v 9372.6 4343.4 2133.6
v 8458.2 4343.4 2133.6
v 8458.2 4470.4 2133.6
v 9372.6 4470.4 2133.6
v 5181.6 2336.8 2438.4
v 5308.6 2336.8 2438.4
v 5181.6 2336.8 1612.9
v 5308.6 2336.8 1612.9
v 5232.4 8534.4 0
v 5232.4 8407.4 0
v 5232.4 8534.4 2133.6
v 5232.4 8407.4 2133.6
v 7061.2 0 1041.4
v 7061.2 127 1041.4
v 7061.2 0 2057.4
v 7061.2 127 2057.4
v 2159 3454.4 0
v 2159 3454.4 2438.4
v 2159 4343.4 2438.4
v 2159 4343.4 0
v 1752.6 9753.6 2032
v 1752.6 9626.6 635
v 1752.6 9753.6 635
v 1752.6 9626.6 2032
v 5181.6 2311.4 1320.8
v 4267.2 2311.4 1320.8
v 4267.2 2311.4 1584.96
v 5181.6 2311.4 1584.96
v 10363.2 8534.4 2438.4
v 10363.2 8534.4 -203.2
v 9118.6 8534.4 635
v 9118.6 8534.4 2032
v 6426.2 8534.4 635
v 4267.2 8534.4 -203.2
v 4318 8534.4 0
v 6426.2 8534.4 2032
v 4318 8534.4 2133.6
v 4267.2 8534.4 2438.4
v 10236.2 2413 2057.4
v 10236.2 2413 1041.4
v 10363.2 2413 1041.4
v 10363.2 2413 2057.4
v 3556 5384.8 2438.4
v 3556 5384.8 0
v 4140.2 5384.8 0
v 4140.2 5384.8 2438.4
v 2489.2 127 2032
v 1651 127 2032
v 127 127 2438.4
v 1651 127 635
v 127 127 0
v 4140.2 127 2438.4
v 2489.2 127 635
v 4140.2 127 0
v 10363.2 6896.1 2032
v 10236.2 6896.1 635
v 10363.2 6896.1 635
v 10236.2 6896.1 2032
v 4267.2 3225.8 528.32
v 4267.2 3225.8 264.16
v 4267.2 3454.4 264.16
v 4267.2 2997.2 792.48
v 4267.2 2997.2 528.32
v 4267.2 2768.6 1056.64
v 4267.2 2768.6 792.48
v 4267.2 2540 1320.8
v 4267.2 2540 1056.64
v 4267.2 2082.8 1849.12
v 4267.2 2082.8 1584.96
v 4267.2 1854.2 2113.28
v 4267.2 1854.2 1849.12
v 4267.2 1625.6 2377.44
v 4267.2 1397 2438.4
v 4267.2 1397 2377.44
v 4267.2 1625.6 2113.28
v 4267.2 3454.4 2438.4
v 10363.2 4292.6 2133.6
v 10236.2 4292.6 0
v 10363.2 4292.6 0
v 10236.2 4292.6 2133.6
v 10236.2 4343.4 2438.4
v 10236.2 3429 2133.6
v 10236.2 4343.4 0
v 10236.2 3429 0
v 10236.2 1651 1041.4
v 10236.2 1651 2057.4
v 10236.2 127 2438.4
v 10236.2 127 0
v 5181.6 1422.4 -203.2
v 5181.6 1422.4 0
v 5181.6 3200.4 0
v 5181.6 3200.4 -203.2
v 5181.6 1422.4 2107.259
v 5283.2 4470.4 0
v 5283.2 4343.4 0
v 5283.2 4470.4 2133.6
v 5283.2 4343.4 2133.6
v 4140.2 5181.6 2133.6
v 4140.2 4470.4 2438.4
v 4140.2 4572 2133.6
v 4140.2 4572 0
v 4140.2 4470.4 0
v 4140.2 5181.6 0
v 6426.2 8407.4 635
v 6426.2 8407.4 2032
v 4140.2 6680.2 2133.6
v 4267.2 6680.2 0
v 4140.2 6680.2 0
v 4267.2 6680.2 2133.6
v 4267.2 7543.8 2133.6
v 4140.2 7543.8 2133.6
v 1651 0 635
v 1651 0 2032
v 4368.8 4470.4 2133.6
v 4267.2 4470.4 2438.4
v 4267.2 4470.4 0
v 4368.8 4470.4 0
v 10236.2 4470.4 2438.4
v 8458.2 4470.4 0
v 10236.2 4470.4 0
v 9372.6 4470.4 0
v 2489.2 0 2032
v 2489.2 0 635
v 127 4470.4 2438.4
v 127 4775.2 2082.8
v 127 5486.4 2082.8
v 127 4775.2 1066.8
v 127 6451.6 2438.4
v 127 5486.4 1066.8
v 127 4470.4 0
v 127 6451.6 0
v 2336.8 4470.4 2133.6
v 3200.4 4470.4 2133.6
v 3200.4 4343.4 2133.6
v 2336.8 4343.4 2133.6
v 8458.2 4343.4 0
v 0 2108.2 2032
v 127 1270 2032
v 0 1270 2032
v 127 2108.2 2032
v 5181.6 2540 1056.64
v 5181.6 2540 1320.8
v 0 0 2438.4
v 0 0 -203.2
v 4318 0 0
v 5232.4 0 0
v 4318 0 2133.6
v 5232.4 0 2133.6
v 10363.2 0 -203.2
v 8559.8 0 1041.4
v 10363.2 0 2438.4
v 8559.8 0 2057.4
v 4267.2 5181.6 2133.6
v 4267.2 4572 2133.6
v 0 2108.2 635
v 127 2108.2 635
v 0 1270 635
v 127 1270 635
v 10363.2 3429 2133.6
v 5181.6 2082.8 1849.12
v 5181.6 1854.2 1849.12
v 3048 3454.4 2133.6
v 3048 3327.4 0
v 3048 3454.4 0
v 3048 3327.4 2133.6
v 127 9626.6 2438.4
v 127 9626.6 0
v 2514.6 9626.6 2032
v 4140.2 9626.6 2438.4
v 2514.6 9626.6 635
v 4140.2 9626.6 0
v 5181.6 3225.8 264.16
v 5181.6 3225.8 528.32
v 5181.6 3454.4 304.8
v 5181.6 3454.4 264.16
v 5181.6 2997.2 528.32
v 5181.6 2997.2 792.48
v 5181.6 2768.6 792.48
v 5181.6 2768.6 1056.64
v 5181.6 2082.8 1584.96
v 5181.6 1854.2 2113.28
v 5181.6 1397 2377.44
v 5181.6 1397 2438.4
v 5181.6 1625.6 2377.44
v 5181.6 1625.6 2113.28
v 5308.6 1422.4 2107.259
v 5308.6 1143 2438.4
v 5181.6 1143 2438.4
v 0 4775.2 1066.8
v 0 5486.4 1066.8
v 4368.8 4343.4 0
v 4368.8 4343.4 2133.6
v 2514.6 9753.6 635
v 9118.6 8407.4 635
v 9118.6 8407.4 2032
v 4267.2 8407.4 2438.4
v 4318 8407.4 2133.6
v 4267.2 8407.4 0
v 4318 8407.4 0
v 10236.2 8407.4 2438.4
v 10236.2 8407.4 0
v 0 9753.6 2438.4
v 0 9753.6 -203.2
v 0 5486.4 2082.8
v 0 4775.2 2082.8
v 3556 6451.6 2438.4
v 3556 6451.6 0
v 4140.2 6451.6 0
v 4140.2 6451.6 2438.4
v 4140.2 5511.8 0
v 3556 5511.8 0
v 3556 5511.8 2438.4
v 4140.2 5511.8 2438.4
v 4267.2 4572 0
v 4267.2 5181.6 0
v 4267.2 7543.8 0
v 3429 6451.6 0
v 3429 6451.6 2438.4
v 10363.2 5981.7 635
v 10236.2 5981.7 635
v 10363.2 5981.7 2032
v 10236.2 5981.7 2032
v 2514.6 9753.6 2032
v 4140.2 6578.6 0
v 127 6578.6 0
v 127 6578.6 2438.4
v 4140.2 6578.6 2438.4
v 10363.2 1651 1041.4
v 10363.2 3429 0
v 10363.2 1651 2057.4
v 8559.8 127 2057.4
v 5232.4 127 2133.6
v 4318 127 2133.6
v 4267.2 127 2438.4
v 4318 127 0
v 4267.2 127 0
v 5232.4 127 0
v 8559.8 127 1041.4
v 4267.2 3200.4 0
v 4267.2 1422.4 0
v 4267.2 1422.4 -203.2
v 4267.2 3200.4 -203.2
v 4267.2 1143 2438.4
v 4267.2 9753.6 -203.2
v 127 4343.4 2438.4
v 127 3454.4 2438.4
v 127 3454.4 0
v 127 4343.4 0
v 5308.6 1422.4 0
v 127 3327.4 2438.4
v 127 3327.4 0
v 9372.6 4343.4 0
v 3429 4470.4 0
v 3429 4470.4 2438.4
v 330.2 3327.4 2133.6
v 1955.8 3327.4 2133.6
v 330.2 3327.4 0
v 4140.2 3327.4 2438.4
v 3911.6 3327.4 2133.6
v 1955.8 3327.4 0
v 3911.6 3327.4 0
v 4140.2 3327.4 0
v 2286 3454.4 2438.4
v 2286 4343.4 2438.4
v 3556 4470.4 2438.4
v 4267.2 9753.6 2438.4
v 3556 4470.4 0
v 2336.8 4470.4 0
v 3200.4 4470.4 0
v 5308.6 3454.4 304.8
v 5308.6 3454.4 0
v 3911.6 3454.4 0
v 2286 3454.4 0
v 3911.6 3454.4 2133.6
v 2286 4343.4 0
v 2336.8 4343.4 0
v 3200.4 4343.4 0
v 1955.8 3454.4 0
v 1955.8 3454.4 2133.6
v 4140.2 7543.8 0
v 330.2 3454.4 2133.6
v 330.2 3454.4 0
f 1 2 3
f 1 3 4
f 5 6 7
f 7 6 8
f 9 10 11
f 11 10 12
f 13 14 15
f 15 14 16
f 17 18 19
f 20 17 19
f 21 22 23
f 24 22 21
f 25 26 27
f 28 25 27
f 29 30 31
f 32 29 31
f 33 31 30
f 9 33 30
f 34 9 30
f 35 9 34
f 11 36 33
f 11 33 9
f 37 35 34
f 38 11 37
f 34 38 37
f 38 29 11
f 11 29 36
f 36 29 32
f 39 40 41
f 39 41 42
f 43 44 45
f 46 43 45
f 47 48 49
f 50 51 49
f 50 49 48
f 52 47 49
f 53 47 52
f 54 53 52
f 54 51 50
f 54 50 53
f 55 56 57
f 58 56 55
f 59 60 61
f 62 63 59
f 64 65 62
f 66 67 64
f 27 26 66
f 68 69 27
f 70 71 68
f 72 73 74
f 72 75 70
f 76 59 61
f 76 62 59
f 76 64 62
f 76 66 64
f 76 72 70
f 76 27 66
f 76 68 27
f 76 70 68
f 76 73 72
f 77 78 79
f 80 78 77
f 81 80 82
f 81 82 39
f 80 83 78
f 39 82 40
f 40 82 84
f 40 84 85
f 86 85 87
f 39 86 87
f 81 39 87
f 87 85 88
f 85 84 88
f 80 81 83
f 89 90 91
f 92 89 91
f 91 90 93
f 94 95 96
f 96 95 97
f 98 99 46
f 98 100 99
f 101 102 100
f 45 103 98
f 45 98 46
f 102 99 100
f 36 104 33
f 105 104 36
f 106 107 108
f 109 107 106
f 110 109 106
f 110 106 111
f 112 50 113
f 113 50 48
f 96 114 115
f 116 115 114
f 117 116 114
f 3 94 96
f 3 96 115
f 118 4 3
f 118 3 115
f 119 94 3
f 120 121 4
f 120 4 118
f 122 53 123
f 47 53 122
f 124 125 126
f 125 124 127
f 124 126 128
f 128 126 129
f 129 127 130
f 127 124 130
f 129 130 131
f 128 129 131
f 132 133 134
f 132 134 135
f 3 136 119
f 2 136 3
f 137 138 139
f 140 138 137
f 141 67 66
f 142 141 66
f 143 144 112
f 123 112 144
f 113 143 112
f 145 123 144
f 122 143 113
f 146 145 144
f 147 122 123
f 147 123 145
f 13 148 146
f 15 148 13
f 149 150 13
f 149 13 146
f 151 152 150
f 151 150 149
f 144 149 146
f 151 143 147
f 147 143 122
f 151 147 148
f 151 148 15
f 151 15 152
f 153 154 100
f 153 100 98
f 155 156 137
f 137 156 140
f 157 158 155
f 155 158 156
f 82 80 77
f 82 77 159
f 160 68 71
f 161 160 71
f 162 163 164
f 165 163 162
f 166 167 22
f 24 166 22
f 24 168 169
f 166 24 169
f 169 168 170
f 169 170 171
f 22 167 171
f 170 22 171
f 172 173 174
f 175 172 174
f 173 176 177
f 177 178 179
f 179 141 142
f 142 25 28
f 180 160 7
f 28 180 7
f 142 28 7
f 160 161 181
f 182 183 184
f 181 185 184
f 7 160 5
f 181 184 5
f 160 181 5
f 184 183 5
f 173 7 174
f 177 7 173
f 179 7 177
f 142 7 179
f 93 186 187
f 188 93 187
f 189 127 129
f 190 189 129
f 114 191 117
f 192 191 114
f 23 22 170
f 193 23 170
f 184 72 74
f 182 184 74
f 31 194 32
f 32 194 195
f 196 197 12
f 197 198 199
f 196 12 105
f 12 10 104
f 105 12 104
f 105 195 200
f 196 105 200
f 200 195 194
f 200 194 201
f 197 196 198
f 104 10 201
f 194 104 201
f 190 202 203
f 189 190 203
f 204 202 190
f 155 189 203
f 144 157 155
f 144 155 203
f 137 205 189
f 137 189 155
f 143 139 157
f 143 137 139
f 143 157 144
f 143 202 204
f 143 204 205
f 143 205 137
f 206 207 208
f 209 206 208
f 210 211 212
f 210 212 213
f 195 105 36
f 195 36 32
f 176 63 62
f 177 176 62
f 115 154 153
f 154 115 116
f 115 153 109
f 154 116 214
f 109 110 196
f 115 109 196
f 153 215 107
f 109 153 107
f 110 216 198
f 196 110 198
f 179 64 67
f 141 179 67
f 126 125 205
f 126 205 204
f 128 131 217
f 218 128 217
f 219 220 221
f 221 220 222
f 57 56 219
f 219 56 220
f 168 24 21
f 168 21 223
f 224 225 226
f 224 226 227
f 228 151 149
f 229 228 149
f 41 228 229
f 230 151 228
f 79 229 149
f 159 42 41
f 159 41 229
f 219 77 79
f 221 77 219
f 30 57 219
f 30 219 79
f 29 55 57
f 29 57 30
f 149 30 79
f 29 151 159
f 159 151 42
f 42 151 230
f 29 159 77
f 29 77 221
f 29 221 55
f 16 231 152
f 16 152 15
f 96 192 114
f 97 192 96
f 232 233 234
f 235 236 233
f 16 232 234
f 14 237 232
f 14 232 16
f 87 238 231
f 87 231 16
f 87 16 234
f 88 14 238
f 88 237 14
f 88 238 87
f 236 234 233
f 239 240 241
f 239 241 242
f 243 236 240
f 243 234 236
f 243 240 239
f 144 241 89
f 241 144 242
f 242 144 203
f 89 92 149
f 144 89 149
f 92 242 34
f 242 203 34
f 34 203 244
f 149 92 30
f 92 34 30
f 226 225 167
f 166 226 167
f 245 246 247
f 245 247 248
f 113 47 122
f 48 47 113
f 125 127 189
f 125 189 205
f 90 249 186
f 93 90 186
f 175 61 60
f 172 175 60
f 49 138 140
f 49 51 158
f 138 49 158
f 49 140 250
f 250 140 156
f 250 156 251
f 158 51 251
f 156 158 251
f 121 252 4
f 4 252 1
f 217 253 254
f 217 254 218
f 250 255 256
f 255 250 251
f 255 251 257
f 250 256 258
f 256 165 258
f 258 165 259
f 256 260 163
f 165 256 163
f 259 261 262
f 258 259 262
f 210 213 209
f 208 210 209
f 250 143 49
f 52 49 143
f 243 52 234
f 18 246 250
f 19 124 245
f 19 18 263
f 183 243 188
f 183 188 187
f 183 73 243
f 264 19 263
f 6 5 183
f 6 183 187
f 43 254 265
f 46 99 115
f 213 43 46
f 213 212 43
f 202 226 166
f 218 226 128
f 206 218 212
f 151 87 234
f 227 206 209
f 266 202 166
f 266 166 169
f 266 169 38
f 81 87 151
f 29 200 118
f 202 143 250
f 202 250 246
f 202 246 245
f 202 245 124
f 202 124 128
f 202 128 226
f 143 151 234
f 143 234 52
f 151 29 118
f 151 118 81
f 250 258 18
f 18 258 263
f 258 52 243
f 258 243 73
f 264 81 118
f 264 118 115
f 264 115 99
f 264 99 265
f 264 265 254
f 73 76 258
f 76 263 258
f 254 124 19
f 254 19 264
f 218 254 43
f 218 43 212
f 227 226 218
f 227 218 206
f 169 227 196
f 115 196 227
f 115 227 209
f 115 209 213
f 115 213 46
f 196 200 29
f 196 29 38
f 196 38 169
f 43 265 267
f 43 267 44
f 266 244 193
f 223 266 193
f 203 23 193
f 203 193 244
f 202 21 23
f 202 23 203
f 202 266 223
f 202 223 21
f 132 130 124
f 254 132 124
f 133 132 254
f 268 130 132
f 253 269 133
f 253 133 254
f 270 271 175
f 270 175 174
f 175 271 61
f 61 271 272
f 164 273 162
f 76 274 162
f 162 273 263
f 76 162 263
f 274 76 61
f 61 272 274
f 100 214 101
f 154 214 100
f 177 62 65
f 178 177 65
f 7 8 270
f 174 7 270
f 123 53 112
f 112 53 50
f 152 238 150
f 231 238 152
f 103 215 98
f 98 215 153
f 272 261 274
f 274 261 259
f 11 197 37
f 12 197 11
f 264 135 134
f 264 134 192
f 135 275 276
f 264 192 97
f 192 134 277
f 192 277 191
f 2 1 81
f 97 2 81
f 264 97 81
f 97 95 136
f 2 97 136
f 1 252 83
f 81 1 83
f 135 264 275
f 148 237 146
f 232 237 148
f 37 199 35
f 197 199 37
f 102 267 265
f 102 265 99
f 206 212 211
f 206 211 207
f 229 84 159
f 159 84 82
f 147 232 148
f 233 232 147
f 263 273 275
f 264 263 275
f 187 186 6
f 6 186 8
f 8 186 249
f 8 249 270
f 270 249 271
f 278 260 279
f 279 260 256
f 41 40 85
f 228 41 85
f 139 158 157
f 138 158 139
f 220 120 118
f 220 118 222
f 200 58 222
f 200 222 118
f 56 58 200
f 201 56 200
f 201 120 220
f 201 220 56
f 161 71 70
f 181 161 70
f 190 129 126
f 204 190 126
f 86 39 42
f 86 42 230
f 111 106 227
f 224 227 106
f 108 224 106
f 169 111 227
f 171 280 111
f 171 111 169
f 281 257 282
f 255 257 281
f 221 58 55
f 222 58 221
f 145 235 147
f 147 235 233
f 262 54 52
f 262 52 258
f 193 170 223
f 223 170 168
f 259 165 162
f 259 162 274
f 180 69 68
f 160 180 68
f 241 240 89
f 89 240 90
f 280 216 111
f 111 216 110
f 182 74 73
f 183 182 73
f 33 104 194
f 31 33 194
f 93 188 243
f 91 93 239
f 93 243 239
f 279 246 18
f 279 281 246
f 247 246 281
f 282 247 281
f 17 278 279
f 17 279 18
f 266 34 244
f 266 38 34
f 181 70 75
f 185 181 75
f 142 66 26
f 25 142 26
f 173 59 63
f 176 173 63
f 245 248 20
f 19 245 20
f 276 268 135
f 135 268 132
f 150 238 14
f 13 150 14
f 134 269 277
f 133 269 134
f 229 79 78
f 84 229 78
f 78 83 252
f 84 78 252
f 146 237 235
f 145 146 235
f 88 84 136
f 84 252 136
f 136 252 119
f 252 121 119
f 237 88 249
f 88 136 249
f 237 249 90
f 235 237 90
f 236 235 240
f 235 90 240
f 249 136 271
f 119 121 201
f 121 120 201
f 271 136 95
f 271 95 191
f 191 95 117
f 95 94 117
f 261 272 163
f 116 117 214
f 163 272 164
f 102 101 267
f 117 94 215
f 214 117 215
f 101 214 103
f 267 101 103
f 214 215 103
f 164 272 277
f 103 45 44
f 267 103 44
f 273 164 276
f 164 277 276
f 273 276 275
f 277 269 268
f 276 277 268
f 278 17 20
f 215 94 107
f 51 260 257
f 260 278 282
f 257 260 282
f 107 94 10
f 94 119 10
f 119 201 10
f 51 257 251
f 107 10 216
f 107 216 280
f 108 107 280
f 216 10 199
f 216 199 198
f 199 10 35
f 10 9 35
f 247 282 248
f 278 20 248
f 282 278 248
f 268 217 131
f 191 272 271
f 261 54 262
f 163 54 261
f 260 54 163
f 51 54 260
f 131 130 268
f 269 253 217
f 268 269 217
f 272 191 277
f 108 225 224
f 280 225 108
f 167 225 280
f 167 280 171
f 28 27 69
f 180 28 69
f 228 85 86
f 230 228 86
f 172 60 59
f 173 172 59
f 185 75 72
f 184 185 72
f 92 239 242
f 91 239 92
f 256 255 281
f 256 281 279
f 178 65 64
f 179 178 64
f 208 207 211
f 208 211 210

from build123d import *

# Parameters (mm, degrees)
F0_W           = 4013.2
F0_H           = 3200.4
F0_W_2         = 914.4
F0_W_3         = 2032
F0_H_2         = 889
F0_W_4         = 3302
F0_H_3         = 1981.2
F0_W_5         = 584.2
F0_H_4         = 914.4
F0_H_5         = 939.8
F0_H_6         = 3048
F0_W_6         = 5969
F0_H_7         = 3937
F1_DEPTH       = 2438.4
F2_W           = 914.4
F2_H           = 1778
F3_DEPTH       = 203.2
F4_W           = 863.6
F4_H           = 2133.6
F4_W_2         = 762
F4_H_2         = 1016
F5_DEPTH       = 127
F6_W           = 914.4
F6_H           = 2133.6
F7_DEPTH       = 127
F9_DEPTH       = 127
F10_W          = 1498.6
F10_H          = 1016
F10_W_2        = 914.4
F10_H_2        = 2133.6
F11_DEPTH      = 127
F12_W          = 914.4
F12_H          = 1397
F13_DEPTH      = 127
F14_W          = 914.4
F14_H          = 2133.6
F14_W_2        = 2692.4
F14_H_2        = 1397
F15_DEPTH      = 127
F15_DEPTH_BACK = 25.4
F16_W          = 609.6
F16_H          = 2133.6
F16_W_2        = 863.6
F17_DEPTH      = 127
F18_W          = 711.2
F18_H          = 1016
F19_DEPTH      = 127
F20_W          = 863.6
F20_H          = 2133.6
F21_DEPTH      = 127
F22_W          = 863.6
F22_H          = 2133.6
F22_W_2        = 1625.6
F23_DEPTH      = 127
F24_W          = 838.2
F24_H          = 1397
F25_DEPTH      = 127
F26_W          = 838.2
F26_H          = 1397
F27_DEPTH      = 127
F28_W          = 914.4
F28_H          = 2438.4
F29_DEPTH      = 127
F35_DEPTH      = 914.4
F31_DEPTH      = 127
F32_W          = 762
F32_H          = 1397
F33_DEPTH      = 127


with BuildPart() as f1:
    # F0 (on Top) → F1 (new body)
    with BuildSketch(Plane.XY):
        Polygon((0, 9753.6), (0, 0), (10363.2, 0), (10363.2, 8534.4), (4267.2, 8534.4), (4267.2, 9753.6), align=None)
        with Locations((2133.6, 1727.2)):
            Rectangle(F0_W, F0_H, mode=Mode.SUBTRACT)
        with Locations((4724.4, 1727.2)):
            Rectangle(F0_W_2, F0_H, mode=Mode.SUBTRACT)
        with Locations((1143, 3898.9)):
            Rectangle(F0_W_3, F0_H_2, mode=Mode.SUBTRACT)
        Polygon((5308.6, 3454.4), (2286, 3454.4), (2286, 4343.4), (10236.2, 4343.4), (10236.2, 127), (5308.6, 127), align=None, mode=Mode.SUBTRACT)
        with Locations((1778, 5461)):
            Rectangle(F0_W_4, F0_H_3, mode=Mode.SUBTRACT)
        with Locations((3848.1, 4927.6)):
            Rectangle(F0_W_5, F0_H_4, mode=Mode.SUBTRACT)
        with Locations((3848.1, 5981.7)):
            Rectangle(F0_W_5, F0_H_5, mode=Mode.SUBTRACT)
        with Locations((2133.6, 8102.6)):
            Rectangle(F0_W, F0_H_6, mode=Mode.SUBTRACT)
        with Locations((7251.7, 6438.9)):
            Rectangle(F0_W_6, F0_H_7, mode=Mode.SUBTRACT)
    extrude(amount=F1_DEPTH)

    # F2 (on Top) → F3 (join)
    with BuildSketch(Plane.XY):
        Polygon((0, 9753.6), (0, 0), (10363.2, 0), (10363.2, 8534.4), (4267.2, 8534.4), (4267.2, 9753.6), align=None)
        with Locations((4724.4, 2311.4)):
            Rectangle(F2_W, F2_H, mode=Mode.SUBTRACT)
    extrude(amount=-F3_DEPTH)

    # F4 (on face) → F5 (cut, through all)
    with BuildSketch(Plane(origin=(10236.2, 0, 0), x_dir=(0, -1, 0), z_dir=(-1, 0, 0))):
        with Locations((-3860.8, 1066.8)):
            Rectangle(F4_W, F4_H)
        with Locations((-2032, 1549.4)):
            Rectangle(F4_W_2, F4_H_2)
    extrude(amount=-F5_DEPTH, mode=Mode.SUBTRACT)

    # F6 (on face) → F7 (cut, through all)
    with BuildSketch(Plane.XZ.offset(-4343.4)):
        with Locations((4826, 1066.8)):
            Rectangle(F6_W, F6_H)
        with Locations((8915.4, 1066.8)):
            Rectangle(F6_W, F6_H)
    extrude(amount=-F7_DEPTH, mode=Mode.SUBTRACT)

    # F8 (on face) → F9 (cut, through all)
    with BuildSketch(Plane.YZ.offset(5308.6)):
        Polygon((127, 2438.4), (127, 0), (1422.4, 0), (1422.4, 2107.259259), (1143, 2438.4), align=None)
    extrude(amount=-F9_DEPTH, mode=Mode.SUBTRACT)

    # F10 (on face) → F11 (cut, through all)
    with BuildSketch(Plane(origin=(0, 127, 0), x_dir=(-1, 0, 0), z_dir=(0, 1, 0))):
        with Locations((-7810.5, 1549.4)):
            Rectangle(F10_W, F10_H)
        with Locations((-4775.2, 1066.8)):
            Rectangle(F10_W_2, F10_H_2)
    extrude(amount=-F11_DEPTH, mode=Mode.SUBTRACT)

    # F12 (on face) → F13 (cut, through all)
    with BuildSketch(Plane(origin=(10236.2, 0, 0), x_dir=(0, -1, 0), z_dir=(-1, 0, 0))):
        with Locations((-6438.9, 1333.5)):
            Rectangle(F12_W, F12_H)
    extrude(amount=-F13_DEPTH, mode=Mode.SUBTRACT)

    # F14 (on face) → F15 (cut, two sides)
    with BuildSketch(Plane.XZ.offset(-8407.4)) as f15_sk:
        with Locations((4775.2, 1066.8)):
            Rectangle(F14_W, F14_H)
        with Locations((7772.4, 1333.5)):
            Rectangle(F14_W_2, F14_H_2)
    extrude(amount=-F15_DEPTH, mode=Mode.SUBTRACT)
    extrude(f15_sk.sketch, amount=-F15_DEPTH_BACK, mode=Mode.SUBTRACT)

    # F16 (on face) → F17 (cut, through all)
    with BuildSketch(Plane.YZ.offset(4267.2)):
        with Locations((4876.8, 1066.8)):
            Rectangle(F16_W, F16_H)
        with Locations((7112, 1066.8)):
            Rectangle(F16_W_2, F16_H)
    extrude(amount=-F17_DEPTH, mode=Mode.SUBTRACT)

    # F18 (on face) → F19 (cut, through all)
    with BuildSketch(Plane.YZ.offset(127)):
        with Locations((5130.8, 1574.8)):
            Rectangle(F18_W, F18_H)
    extrude(amount=-F19_DEPTH, mode=Mode.SUBTRACT)

    # F20 (on face) → F21 (cut, through all)
    with BuildSketch(Plane(origin=(0, 4470.4, 0), x_dir=(-1, 0, 0), z_dir=(0, 1, 0))):
        with Locations((-2768.6, 1066.8)):
            Rectangle(F20_W, F20_H)
    extrude(amount=-F21_DEPTH, mode=Mode.SUBTRACT)

    # F22 (on face) → F23 (cut, through all)
    with BuildSketch(Plane.XZ.offset(-3327.4)):
        with Locations((3479.8, 1066.8)):
            Rectangle(F22_W, F22_H)
        with Locations((1143, 1066.8)):
            Rectangle(F22_W_2, F22_H)
    extrude(amount=-F23_DEPTH, mode=Mode.SUBTRACT)

    # F24 (on face) → F25 (cut, through all)
    with BuildSketch(Plane.YZ.offset(127)):
        with Locations((1689.1, 1333.5)):
            Rectangle(F24_W, F24_H)
    extrude(amount=-F25_DEPTH, mode=Mode.SUBTRACT)

    # F26 (on face) → F27 (cut, through all)
    with BuildSketch(Plane(origin=(0, 127, 0), x_dir=(-1, 0, 0), z_dir=(0, 1, 0))):
        with Locations((-2070.1, 1333.5)):
            Rectangle(F26_W, F26_H)
    extrude(amount=-F27_DEPTH, mode=Mode.SUBTRACT)

    # F28 (on face) → F29 (cut, through all)
    with BuildSketch(Plane.XZ.offset(-3327.4)):
        with Locations((4724.4, 1219.2)):
            Rectangle(F28_W, F28_H)
    extrude(amount=-F29_DEPTH, mode=Mode.SUBTRACT)

    # F34 (on face) → F35 (join)
    with BuildSketch(Plane.YZ.offset(4267.2)):
        Polygon((3200.4, 0), (3454.4, 0), (3454.4, 264.16), (3225.8, 264.16), (3225.8, 528.32), (2997.2, 528.32), (2997.2, 792.48), (2768.6, 792.48), (2768.6, 1056.64), (2540, 1056.64), (2540, 1320.8), (2311.4, 1320.8), (2311.4, 1584.96), (2082.8, 1584.96), (2082.8, 1849.12), (1854.2, 1849.12), (1854.2, 2113.28), (1625.6, 2113.28), (1625.6, 2377.44), (1397, 2377.44), (1397, 2438.4), (1143, 2438.4), align=None)
    extrude(amount=F35_DEPTH)

    # F30 (on face) → F31 (cut, through all)
    with BuildSketch(Plane.YZ.offset(5308.6)):
        Polygon((2336.8, 1612.9), (3454.4, 304.8), (3454.4, 2438.4), (2336.8, 2438.4), align=None)
    extrude(amount=-F31_DEPTH, mode=Mode.SUBTRACT)

    # F32 (on face) → F33 (cut, through all)
    with BuildSketch(Plane.XZ.offset(-9626.6)):
        with Locations((2133.6, 1333.5)):
            Rectangle(F32_W, F32_H)
    extrude(amount=-F33_DEPTH, mode=Mode.SUBTRACT)


solid = f1.part
